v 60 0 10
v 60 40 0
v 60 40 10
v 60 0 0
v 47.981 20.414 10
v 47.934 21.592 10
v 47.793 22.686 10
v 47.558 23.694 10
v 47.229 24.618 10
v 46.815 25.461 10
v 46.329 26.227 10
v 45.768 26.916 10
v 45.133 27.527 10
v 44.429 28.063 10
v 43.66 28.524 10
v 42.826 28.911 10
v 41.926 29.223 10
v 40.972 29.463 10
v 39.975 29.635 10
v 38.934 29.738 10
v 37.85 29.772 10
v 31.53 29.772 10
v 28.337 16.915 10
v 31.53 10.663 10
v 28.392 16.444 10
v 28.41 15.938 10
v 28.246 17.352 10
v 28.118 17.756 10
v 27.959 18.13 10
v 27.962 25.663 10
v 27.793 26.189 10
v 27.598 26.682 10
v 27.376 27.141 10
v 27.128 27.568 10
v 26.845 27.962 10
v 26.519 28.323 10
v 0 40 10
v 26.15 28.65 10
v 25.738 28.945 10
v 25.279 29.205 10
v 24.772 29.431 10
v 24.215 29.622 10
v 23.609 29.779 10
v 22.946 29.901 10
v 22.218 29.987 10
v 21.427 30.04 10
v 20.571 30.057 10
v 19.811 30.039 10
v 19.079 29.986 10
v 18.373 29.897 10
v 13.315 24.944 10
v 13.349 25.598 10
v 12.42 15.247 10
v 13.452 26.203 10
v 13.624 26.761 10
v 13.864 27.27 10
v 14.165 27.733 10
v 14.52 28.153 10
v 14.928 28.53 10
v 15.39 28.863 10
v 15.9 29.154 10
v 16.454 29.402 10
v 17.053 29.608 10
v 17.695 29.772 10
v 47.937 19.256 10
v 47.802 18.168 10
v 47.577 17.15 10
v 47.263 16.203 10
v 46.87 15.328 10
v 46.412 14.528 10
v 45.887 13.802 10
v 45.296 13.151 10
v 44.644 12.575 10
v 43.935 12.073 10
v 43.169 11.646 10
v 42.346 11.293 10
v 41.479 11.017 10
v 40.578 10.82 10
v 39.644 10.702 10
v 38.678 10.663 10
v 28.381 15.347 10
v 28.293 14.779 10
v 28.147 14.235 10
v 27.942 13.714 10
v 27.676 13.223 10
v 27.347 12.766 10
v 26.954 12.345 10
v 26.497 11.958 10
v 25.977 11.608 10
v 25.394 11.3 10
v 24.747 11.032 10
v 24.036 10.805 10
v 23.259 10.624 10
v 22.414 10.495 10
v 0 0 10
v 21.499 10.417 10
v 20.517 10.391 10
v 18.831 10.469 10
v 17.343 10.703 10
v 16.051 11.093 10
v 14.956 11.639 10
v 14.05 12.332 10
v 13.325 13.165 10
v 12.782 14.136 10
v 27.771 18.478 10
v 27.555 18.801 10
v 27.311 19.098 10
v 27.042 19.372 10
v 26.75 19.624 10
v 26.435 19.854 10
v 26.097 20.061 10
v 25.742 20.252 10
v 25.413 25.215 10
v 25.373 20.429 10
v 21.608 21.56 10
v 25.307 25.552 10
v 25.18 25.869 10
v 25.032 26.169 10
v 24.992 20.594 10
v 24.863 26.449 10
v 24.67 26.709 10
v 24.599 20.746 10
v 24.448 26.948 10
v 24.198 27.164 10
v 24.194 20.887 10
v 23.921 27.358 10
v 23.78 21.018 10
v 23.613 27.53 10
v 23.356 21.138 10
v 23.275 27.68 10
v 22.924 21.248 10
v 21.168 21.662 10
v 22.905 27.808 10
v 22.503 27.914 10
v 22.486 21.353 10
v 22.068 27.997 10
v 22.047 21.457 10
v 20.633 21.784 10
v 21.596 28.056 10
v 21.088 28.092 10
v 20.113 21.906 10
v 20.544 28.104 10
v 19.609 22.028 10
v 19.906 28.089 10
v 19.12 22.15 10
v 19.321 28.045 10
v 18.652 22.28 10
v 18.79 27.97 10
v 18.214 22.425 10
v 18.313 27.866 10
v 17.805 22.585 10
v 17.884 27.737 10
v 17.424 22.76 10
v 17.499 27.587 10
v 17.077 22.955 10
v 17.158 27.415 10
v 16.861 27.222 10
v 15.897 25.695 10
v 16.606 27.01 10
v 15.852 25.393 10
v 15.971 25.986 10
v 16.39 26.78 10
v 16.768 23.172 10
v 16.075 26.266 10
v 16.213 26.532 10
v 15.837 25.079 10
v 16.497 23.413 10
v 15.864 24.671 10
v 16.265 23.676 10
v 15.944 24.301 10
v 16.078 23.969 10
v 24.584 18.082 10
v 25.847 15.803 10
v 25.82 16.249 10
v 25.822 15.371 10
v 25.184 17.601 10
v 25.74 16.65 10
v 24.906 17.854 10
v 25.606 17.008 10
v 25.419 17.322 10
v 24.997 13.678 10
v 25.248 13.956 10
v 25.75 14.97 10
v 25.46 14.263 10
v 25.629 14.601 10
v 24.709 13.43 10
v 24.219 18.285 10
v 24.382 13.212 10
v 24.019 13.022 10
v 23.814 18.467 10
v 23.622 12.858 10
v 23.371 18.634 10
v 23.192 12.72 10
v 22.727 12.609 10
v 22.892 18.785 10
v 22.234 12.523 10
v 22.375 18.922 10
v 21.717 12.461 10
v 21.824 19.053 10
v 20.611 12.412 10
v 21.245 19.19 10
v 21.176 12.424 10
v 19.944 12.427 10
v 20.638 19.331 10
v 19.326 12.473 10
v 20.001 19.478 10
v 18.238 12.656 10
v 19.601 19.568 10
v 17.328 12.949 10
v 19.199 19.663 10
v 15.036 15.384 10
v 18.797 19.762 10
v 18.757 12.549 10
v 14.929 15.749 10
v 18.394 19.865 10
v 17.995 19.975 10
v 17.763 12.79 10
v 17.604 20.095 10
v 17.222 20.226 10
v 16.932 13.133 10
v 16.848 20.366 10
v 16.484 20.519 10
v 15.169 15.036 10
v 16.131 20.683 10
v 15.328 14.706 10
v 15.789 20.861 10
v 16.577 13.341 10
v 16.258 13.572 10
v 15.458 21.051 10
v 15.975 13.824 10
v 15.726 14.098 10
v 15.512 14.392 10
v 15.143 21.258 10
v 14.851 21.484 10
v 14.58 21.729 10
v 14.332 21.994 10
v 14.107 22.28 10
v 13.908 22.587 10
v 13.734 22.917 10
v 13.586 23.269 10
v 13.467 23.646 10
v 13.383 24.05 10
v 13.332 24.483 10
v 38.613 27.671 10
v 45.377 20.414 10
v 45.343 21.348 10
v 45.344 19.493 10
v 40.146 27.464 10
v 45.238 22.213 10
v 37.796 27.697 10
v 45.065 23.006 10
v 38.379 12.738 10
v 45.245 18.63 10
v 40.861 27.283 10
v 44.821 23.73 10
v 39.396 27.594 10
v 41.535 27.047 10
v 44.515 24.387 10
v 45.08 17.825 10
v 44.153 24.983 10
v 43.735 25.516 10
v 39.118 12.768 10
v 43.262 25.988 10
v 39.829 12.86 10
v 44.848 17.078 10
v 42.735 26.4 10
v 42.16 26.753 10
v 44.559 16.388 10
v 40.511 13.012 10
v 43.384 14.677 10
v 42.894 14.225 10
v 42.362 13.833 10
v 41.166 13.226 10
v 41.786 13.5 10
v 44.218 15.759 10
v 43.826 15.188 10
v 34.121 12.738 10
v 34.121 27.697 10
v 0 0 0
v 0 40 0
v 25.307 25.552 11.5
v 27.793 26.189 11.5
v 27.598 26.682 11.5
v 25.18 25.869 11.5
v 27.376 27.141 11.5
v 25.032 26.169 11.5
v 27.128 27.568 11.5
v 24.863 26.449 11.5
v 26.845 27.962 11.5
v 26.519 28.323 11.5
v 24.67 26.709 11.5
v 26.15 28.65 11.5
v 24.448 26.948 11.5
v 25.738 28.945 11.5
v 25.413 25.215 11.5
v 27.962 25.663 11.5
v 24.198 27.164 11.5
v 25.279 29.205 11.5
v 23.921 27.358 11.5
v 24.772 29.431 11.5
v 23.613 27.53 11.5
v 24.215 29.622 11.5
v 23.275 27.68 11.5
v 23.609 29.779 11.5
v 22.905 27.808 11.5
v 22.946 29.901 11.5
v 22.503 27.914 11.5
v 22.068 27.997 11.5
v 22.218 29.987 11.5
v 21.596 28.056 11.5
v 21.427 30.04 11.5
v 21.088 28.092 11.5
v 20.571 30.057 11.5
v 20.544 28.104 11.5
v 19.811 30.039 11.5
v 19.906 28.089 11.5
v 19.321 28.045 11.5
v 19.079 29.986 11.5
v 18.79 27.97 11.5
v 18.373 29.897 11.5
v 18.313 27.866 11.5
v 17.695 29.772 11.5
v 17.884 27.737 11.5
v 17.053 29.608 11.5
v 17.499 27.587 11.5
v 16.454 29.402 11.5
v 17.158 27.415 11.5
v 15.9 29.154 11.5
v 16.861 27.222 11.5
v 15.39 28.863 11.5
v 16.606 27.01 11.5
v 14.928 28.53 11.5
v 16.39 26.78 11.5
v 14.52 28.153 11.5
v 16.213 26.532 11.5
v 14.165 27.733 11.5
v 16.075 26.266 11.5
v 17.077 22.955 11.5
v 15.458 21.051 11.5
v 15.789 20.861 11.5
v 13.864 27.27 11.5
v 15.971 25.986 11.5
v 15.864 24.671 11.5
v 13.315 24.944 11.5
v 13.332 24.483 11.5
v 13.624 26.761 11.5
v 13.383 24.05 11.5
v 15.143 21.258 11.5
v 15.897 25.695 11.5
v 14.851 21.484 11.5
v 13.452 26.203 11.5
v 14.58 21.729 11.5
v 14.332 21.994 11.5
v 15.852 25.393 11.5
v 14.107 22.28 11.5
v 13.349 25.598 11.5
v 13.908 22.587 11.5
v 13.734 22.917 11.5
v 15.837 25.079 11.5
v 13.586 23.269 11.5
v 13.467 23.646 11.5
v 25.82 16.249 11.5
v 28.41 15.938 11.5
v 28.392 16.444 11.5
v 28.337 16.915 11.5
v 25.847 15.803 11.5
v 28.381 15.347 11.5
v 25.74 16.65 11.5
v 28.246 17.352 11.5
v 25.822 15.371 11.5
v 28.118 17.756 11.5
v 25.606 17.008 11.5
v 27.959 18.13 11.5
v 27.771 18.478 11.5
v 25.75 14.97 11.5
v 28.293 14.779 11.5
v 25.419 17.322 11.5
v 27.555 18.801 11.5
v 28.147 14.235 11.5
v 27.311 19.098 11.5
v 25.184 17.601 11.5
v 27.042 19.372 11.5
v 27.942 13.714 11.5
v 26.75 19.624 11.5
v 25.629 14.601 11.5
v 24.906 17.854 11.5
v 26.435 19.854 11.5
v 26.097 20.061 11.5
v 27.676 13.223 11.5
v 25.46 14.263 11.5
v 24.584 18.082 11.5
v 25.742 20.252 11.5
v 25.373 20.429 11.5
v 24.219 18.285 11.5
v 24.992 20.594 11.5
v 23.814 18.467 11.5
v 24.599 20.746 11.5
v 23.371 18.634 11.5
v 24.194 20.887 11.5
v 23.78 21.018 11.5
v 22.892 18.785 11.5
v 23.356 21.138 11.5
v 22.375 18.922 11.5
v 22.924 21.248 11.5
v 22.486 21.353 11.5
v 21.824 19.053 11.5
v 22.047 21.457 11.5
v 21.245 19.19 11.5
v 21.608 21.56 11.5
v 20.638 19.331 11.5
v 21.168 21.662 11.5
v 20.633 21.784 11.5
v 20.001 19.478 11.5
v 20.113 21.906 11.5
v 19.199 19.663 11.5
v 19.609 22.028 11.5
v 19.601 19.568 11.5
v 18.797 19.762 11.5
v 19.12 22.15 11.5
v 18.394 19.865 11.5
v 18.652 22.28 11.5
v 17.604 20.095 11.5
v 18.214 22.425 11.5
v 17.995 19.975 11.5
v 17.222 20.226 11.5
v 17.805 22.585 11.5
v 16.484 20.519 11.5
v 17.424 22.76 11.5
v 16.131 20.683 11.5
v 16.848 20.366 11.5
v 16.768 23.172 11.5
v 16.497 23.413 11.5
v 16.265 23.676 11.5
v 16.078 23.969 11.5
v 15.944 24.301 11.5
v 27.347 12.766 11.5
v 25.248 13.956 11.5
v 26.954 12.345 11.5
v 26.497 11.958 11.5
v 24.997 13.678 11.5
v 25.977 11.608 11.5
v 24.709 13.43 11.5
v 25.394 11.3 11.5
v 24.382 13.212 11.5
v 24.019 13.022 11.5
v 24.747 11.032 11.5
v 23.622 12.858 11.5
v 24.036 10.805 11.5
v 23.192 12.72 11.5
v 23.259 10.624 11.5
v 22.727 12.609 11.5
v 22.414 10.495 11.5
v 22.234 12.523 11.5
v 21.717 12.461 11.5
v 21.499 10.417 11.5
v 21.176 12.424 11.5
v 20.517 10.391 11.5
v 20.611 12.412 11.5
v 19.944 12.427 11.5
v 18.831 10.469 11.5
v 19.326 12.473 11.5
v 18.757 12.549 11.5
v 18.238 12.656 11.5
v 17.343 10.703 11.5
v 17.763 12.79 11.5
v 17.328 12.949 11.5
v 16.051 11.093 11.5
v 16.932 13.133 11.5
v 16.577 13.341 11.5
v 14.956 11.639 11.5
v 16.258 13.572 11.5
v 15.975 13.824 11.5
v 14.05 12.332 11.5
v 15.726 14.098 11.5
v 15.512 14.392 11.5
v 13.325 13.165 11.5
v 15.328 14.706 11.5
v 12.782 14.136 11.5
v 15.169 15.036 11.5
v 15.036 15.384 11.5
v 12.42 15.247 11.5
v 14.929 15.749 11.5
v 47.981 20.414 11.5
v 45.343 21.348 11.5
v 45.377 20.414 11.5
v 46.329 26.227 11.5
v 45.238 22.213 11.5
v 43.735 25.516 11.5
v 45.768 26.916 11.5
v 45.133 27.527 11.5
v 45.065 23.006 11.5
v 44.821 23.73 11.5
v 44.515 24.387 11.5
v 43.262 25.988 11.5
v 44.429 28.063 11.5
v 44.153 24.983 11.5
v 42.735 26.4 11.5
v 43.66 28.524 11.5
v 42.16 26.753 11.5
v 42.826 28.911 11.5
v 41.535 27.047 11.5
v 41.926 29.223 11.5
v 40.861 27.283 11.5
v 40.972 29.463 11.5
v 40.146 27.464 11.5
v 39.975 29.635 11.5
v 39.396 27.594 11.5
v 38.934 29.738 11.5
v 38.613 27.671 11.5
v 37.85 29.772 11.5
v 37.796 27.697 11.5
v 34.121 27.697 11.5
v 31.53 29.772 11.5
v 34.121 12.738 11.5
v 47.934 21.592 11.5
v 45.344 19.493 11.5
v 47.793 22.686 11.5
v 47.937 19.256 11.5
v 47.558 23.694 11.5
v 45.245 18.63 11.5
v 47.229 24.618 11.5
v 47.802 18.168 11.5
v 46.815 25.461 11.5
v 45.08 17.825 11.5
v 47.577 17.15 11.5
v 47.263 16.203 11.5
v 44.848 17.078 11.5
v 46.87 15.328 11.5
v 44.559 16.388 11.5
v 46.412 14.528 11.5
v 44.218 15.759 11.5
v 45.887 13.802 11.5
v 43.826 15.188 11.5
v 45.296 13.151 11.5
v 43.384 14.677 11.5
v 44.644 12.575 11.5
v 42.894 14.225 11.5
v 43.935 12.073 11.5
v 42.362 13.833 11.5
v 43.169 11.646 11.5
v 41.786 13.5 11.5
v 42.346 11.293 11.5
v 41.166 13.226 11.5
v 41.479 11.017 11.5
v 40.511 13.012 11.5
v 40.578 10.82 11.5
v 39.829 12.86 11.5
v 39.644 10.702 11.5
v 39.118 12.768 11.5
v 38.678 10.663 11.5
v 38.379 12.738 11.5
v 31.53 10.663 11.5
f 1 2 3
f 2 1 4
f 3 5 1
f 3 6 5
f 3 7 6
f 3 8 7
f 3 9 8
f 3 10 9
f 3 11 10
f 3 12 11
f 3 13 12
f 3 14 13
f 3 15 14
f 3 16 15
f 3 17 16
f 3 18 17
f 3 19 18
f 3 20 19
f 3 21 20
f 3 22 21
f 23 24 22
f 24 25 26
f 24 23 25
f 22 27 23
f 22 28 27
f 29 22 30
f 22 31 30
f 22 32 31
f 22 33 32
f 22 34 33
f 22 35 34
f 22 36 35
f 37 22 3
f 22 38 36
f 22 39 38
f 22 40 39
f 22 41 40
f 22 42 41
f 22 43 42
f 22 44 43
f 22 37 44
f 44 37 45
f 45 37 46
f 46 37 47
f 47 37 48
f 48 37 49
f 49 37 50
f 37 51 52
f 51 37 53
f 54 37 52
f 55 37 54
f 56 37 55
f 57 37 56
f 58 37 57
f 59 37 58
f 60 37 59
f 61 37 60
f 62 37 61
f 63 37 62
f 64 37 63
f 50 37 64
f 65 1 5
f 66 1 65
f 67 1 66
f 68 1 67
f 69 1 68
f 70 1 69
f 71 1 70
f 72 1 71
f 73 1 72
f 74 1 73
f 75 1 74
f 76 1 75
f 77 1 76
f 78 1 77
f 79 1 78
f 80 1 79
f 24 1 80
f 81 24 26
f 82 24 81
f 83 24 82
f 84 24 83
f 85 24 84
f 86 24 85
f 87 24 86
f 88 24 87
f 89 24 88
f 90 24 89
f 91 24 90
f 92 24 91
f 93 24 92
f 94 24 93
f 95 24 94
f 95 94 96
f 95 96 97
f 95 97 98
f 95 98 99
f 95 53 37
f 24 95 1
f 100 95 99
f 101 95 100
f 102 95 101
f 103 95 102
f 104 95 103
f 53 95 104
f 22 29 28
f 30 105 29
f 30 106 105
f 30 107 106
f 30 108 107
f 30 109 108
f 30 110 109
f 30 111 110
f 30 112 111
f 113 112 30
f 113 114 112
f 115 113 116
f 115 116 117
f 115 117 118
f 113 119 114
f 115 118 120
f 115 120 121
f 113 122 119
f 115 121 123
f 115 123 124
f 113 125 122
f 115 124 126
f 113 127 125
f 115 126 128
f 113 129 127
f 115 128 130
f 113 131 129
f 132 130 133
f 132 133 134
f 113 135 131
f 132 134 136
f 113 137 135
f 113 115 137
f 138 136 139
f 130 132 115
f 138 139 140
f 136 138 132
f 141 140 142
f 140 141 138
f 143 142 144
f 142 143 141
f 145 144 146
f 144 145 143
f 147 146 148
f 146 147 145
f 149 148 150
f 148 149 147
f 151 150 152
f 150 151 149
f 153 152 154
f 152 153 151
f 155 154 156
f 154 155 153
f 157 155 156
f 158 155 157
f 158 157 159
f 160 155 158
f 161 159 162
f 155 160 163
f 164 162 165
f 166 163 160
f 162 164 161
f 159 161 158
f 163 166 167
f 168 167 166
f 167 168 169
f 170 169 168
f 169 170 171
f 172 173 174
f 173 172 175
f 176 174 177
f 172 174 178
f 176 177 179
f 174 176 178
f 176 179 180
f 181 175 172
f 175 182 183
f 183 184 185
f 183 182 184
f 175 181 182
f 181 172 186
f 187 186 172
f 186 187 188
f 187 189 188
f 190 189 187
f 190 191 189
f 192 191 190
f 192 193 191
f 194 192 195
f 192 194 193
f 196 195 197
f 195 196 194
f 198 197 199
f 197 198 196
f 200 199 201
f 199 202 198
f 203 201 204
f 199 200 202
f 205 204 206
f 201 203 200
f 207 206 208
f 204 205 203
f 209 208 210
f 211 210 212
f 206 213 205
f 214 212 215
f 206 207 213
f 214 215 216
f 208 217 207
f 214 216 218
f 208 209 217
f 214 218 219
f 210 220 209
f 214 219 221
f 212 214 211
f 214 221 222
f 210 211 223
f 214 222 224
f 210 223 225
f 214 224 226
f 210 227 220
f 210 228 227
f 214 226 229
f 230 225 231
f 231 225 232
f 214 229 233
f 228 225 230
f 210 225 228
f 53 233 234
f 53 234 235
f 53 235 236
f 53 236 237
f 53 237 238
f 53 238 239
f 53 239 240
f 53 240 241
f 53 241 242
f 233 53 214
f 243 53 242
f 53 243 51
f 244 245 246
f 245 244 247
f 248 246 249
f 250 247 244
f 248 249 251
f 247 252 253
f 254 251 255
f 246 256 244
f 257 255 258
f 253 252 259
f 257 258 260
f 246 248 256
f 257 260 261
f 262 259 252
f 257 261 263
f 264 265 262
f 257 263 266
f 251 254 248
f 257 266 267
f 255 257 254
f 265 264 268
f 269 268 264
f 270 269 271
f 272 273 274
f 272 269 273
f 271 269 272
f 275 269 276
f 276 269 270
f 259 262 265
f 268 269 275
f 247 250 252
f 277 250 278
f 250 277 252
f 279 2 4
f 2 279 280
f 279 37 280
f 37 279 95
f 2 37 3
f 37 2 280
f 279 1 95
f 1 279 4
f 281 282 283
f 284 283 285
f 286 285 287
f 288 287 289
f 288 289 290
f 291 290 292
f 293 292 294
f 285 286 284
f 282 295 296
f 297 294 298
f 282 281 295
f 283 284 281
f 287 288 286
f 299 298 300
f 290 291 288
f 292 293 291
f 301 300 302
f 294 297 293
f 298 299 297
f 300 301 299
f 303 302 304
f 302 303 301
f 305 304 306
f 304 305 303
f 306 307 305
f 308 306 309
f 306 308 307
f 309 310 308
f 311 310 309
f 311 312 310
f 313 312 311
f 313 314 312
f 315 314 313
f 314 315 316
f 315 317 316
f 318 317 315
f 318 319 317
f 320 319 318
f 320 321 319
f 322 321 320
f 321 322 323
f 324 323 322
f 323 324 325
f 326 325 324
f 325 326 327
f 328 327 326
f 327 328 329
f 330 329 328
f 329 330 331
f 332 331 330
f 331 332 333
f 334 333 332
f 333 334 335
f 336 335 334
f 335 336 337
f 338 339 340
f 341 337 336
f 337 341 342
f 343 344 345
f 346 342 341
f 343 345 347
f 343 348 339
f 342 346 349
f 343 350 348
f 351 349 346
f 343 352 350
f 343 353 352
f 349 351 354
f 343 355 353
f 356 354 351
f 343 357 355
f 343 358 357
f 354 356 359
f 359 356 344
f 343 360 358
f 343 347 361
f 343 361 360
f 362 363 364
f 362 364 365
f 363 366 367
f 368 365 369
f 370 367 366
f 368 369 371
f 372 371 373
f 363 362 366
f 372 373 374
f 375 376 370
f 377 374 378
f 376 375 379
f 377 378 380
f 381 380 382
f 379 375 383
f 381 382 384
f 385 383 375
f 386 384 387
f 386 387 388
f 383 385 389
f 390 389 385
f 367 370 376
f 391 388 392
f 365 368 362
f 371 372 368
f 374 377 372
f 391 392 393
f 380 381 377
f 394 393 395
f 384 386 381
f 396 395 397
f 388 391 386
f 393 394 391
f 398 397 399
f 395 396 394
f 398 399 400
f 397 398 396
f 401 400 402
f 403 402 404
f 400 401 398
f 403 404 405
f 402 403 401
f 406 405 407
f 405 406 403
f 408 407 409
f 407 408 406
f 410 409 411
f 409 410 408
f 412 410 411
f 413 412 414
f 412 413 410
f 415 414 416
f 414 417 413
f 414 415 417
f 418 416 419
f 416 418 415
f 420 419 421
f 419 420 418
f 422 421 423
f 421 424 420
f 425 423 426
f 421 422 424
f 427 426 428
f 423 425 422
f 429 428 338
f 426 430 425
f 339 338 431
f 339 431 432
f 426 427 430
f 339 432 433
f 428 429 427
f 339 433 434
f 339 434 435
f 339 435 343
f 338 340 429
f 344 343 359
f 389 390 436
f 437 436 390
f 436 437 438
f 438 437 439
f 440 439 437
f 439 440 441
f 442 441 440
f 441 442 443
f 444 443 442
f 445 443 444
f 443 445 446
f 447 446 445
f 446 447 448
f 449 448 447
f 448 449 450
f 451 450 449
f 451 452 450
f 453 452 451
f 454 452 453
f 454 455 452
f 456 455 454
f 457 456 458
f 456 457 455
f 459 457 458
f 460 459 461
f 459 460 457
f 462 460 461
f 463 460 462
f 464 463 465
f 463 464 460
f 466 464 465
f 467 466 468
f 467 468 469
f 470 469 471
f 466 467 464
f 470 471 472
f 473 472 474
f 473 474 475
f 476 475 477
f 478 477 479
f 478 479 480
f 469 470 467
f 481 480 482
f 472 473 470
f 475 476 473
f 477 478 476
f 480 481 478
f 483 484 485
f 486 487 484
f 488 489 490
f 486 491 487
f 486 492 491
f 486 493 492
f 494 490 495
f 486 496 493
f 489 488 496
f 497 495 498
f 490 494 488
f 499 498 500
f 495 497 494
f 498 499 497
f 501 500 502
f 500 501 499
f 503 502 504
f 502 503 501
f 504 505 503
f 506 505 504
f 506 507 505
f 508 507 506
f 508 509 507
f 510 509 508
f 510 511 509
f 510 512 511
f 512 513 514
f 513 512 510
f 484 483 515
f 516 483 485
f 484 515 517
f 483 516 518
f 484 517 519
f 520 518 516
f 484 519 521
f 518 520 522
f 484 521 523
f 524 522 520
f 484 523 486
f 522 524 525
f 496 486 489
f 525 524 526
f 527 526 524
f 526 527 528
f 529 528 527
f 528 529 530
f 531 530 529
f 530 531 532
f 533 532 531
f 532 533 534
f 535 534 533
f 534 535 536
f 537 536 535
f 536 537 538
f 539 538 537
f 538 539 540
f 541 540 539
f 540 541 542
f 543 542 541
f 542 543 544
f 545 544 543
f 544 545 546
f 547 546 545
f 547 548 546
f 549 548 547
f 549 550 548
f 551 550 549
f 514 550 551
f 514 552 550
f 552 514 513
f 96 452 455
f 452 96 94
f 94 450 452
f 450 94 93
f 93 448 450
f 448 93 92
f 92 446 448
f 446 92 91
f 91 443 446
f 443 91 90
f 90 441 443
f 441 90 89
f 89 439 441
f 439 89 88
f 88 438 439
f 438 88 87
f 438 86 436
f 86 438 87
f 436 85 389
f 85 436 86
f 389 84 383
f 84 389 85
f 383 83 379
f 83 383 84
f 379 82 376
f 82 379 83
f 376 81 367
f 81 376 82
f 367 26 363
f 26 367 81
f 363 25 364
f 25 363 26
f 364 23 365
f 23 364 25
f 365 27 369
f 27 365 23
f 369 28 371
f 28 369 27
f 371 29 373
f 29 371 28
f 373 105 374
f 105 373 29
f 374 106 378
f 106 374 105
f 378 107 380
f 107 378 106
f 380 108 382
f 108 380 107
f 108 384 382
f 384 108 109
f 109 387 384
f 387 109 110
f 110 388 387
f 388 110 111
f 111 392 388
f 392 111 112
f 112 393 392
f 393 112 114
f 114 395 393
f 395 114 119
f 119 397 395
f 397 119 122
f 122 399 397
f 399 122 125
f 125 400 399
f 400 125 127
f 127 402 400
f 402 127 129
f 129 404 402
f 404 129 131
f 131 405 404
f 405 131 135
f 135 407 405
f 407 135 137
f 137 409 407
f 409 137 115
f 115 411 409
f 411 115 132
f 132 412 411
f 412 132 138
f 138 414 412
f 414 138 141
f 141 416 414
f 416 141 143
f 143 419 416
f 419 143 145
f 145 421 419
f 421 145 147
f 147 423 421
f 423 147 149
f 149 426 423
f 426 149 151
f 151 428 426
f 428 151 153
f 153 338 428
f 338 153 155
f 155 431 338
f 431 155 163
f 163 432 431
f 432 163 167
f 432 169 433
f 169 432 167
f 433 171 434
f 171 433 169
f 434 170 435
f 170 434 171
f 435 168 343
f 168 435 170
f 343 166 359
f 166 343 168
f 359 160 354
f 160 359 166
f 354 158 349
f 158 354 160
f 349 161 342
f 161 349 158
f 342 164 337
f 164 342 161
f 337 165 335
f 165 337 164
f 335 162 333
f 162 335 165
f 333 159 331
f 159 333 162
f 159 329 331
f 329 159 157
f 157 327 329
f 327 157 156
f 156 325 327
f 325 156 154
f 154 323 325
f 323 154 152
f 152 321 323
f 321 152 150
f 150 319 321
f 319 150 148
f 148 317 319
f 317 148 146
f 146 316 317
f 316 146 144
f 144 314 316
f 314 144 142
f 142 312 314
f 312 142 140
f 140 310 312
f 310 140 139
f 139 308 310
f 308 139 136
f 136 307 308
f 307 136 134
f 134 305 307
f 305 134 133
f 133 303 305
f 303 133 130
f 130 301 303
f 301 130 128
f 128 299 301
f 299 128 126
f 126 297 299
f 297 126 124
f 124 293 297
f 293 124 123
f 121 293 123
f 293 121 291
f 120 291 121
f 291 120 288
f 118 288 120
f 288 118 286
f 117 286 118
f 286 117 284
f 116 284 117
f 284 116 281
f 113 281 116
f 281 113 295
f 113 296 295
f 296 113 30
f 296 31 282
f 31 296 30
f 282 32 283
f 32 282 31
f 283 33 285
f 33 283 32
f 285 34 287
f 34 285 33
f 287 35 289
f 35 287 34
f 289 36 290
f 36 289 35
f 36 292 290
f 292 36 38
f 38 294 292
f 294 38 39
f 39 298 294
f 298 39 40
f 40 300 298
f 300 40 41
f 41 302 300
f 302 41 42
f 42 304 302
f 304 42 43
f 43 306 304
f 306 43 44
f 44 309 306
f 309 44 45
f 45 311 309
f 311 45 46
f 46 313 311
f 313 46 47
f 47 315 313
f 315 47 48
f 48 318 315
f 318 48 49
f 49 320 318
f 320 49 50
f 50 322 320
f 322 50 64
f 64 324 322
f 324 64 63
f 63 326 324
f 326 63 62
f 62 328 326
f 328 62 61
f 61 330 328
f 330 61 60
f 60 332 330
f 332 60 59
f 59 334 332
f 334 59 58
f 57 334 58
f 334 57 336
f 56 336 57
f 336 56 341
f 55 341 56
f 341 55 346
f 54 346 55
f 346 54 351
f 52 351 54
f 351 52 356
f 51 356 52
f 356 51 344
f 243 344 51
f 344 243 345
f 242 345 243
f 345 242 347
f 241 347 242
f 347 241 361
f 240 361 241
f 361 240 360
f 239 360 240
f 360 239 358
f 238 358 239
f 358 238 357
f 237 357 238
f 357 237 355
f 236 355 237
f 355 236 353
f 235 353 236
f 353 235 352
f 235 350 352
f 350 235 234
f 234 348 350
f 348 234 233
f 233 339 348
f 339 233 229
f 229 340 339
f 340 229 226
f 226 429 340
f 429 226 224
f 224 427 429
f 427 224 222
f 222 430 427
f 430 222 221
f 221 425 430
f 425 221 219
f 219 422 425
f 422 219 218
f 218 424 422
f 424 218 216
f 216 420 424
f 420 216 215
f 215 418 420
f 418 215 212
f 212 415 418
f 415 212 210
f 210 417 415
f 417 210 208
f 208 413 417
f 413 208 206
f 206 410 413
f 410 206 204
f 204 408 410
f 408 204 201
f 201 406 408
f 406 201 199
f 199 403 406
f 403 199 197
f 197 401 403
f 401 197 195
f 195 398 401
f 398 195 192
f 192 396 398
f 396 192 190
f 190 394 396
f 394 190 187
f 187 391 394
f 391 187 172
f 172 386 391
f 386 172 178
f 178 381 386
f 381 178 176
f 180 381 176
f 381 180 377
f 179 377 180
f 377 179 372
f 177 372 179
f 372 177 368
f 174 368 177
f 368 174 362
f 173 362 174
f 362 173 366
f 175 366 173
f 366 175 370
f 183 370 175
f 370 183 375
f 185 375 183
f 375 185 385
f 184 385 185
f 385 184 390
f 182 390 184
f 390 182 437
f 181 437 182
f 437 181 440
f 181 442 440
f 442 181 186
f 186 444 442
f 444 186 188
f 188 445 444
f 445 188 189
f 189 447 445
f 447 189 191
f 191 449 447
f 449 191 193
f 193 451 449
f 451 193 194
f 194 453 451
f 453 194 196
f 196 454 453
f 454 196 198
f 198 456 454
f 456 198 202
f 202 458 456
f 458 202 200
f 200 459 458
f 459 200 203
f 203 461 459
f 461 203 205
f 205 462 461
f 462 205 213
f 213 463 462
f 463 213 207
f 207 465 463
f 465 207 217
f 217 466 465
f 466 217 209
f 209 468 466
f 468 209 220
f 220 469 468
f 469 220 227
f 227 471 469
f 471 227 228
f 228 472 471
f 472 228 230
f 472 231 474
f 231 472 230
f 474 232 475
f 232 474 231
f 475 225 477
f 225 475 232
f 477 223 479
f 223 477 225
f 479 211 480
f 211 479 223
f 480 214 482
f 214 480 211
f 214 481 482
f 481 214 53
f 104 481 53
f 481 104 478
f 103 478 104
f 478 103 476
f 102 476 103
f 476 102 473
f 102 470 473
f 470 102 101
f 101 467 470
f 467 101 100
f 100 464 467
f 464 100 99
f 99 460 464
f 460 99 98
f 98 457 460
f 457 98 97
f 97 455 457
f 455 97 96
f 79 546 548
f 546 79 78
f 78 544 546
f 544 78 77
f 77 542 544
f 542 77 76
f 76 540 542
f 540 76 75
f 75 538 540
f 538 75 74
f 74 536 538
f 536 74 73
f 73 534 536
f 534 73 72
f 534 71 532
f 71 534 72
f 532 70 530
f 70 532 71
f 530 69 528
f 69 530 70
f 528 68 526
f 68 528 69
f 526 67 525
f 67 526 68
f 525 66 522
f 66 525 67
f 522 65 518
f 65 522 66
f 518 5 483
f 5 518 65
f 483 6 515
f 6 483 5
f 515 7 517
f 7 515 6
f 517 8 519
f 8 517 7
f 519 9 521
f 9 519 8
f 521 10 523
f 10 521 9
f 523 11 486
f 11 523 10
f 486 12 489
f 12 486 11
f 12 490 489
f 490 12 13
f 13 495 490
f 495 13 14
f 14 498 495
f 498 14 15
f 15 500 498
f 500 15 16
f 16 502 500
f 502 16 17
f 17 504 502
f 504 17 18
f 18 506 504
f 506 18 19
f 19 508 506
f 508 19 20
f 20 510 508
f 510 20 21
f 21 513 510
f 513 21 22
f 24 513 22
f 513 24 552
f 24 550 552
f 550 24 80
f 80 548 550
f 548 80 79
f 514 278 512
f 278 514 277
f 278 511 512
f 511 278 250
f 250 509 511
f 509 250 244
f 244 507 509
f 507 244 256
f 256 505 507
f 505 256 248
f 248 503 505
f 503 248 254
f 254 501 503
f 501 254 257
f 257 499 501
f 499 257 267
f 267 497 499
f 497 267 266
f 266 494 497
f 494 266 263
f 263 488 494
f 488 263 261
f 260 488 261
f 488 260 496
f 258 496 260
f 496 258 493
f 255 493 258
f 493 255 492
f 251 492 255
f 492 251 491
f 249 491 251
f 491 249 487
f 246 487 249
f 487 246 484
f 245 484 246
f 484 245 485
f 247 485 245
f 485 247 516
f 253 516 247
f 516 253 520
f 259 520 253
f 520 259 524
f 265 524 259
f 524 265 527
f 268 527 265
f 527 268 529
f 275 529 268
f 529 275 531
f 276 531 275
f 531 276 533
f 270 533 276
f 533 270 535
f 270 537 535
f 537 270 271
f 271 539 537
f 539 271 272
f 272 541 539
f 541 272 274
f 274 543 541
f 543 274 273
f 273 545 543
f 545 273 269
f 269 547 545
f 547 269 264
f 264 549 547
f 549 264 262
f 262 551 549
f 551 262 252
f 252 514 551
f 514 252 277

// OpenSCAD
// Parameters
initials = "SD";  

font_size = 20;     
block_width = 60;
block_depth = 40;
block_height = 10;
text_height = 1.5;     // Height of the embossed text

// Create the block
cube([block_width, block_depth, block_height]);

// Embossed text on top
translate([block_width/2, block_depth/2, block_height])
linear_extrude(height = text_height)
    text(initials, size = font_size, font = "Arial", halign = "center", valign = "center");
